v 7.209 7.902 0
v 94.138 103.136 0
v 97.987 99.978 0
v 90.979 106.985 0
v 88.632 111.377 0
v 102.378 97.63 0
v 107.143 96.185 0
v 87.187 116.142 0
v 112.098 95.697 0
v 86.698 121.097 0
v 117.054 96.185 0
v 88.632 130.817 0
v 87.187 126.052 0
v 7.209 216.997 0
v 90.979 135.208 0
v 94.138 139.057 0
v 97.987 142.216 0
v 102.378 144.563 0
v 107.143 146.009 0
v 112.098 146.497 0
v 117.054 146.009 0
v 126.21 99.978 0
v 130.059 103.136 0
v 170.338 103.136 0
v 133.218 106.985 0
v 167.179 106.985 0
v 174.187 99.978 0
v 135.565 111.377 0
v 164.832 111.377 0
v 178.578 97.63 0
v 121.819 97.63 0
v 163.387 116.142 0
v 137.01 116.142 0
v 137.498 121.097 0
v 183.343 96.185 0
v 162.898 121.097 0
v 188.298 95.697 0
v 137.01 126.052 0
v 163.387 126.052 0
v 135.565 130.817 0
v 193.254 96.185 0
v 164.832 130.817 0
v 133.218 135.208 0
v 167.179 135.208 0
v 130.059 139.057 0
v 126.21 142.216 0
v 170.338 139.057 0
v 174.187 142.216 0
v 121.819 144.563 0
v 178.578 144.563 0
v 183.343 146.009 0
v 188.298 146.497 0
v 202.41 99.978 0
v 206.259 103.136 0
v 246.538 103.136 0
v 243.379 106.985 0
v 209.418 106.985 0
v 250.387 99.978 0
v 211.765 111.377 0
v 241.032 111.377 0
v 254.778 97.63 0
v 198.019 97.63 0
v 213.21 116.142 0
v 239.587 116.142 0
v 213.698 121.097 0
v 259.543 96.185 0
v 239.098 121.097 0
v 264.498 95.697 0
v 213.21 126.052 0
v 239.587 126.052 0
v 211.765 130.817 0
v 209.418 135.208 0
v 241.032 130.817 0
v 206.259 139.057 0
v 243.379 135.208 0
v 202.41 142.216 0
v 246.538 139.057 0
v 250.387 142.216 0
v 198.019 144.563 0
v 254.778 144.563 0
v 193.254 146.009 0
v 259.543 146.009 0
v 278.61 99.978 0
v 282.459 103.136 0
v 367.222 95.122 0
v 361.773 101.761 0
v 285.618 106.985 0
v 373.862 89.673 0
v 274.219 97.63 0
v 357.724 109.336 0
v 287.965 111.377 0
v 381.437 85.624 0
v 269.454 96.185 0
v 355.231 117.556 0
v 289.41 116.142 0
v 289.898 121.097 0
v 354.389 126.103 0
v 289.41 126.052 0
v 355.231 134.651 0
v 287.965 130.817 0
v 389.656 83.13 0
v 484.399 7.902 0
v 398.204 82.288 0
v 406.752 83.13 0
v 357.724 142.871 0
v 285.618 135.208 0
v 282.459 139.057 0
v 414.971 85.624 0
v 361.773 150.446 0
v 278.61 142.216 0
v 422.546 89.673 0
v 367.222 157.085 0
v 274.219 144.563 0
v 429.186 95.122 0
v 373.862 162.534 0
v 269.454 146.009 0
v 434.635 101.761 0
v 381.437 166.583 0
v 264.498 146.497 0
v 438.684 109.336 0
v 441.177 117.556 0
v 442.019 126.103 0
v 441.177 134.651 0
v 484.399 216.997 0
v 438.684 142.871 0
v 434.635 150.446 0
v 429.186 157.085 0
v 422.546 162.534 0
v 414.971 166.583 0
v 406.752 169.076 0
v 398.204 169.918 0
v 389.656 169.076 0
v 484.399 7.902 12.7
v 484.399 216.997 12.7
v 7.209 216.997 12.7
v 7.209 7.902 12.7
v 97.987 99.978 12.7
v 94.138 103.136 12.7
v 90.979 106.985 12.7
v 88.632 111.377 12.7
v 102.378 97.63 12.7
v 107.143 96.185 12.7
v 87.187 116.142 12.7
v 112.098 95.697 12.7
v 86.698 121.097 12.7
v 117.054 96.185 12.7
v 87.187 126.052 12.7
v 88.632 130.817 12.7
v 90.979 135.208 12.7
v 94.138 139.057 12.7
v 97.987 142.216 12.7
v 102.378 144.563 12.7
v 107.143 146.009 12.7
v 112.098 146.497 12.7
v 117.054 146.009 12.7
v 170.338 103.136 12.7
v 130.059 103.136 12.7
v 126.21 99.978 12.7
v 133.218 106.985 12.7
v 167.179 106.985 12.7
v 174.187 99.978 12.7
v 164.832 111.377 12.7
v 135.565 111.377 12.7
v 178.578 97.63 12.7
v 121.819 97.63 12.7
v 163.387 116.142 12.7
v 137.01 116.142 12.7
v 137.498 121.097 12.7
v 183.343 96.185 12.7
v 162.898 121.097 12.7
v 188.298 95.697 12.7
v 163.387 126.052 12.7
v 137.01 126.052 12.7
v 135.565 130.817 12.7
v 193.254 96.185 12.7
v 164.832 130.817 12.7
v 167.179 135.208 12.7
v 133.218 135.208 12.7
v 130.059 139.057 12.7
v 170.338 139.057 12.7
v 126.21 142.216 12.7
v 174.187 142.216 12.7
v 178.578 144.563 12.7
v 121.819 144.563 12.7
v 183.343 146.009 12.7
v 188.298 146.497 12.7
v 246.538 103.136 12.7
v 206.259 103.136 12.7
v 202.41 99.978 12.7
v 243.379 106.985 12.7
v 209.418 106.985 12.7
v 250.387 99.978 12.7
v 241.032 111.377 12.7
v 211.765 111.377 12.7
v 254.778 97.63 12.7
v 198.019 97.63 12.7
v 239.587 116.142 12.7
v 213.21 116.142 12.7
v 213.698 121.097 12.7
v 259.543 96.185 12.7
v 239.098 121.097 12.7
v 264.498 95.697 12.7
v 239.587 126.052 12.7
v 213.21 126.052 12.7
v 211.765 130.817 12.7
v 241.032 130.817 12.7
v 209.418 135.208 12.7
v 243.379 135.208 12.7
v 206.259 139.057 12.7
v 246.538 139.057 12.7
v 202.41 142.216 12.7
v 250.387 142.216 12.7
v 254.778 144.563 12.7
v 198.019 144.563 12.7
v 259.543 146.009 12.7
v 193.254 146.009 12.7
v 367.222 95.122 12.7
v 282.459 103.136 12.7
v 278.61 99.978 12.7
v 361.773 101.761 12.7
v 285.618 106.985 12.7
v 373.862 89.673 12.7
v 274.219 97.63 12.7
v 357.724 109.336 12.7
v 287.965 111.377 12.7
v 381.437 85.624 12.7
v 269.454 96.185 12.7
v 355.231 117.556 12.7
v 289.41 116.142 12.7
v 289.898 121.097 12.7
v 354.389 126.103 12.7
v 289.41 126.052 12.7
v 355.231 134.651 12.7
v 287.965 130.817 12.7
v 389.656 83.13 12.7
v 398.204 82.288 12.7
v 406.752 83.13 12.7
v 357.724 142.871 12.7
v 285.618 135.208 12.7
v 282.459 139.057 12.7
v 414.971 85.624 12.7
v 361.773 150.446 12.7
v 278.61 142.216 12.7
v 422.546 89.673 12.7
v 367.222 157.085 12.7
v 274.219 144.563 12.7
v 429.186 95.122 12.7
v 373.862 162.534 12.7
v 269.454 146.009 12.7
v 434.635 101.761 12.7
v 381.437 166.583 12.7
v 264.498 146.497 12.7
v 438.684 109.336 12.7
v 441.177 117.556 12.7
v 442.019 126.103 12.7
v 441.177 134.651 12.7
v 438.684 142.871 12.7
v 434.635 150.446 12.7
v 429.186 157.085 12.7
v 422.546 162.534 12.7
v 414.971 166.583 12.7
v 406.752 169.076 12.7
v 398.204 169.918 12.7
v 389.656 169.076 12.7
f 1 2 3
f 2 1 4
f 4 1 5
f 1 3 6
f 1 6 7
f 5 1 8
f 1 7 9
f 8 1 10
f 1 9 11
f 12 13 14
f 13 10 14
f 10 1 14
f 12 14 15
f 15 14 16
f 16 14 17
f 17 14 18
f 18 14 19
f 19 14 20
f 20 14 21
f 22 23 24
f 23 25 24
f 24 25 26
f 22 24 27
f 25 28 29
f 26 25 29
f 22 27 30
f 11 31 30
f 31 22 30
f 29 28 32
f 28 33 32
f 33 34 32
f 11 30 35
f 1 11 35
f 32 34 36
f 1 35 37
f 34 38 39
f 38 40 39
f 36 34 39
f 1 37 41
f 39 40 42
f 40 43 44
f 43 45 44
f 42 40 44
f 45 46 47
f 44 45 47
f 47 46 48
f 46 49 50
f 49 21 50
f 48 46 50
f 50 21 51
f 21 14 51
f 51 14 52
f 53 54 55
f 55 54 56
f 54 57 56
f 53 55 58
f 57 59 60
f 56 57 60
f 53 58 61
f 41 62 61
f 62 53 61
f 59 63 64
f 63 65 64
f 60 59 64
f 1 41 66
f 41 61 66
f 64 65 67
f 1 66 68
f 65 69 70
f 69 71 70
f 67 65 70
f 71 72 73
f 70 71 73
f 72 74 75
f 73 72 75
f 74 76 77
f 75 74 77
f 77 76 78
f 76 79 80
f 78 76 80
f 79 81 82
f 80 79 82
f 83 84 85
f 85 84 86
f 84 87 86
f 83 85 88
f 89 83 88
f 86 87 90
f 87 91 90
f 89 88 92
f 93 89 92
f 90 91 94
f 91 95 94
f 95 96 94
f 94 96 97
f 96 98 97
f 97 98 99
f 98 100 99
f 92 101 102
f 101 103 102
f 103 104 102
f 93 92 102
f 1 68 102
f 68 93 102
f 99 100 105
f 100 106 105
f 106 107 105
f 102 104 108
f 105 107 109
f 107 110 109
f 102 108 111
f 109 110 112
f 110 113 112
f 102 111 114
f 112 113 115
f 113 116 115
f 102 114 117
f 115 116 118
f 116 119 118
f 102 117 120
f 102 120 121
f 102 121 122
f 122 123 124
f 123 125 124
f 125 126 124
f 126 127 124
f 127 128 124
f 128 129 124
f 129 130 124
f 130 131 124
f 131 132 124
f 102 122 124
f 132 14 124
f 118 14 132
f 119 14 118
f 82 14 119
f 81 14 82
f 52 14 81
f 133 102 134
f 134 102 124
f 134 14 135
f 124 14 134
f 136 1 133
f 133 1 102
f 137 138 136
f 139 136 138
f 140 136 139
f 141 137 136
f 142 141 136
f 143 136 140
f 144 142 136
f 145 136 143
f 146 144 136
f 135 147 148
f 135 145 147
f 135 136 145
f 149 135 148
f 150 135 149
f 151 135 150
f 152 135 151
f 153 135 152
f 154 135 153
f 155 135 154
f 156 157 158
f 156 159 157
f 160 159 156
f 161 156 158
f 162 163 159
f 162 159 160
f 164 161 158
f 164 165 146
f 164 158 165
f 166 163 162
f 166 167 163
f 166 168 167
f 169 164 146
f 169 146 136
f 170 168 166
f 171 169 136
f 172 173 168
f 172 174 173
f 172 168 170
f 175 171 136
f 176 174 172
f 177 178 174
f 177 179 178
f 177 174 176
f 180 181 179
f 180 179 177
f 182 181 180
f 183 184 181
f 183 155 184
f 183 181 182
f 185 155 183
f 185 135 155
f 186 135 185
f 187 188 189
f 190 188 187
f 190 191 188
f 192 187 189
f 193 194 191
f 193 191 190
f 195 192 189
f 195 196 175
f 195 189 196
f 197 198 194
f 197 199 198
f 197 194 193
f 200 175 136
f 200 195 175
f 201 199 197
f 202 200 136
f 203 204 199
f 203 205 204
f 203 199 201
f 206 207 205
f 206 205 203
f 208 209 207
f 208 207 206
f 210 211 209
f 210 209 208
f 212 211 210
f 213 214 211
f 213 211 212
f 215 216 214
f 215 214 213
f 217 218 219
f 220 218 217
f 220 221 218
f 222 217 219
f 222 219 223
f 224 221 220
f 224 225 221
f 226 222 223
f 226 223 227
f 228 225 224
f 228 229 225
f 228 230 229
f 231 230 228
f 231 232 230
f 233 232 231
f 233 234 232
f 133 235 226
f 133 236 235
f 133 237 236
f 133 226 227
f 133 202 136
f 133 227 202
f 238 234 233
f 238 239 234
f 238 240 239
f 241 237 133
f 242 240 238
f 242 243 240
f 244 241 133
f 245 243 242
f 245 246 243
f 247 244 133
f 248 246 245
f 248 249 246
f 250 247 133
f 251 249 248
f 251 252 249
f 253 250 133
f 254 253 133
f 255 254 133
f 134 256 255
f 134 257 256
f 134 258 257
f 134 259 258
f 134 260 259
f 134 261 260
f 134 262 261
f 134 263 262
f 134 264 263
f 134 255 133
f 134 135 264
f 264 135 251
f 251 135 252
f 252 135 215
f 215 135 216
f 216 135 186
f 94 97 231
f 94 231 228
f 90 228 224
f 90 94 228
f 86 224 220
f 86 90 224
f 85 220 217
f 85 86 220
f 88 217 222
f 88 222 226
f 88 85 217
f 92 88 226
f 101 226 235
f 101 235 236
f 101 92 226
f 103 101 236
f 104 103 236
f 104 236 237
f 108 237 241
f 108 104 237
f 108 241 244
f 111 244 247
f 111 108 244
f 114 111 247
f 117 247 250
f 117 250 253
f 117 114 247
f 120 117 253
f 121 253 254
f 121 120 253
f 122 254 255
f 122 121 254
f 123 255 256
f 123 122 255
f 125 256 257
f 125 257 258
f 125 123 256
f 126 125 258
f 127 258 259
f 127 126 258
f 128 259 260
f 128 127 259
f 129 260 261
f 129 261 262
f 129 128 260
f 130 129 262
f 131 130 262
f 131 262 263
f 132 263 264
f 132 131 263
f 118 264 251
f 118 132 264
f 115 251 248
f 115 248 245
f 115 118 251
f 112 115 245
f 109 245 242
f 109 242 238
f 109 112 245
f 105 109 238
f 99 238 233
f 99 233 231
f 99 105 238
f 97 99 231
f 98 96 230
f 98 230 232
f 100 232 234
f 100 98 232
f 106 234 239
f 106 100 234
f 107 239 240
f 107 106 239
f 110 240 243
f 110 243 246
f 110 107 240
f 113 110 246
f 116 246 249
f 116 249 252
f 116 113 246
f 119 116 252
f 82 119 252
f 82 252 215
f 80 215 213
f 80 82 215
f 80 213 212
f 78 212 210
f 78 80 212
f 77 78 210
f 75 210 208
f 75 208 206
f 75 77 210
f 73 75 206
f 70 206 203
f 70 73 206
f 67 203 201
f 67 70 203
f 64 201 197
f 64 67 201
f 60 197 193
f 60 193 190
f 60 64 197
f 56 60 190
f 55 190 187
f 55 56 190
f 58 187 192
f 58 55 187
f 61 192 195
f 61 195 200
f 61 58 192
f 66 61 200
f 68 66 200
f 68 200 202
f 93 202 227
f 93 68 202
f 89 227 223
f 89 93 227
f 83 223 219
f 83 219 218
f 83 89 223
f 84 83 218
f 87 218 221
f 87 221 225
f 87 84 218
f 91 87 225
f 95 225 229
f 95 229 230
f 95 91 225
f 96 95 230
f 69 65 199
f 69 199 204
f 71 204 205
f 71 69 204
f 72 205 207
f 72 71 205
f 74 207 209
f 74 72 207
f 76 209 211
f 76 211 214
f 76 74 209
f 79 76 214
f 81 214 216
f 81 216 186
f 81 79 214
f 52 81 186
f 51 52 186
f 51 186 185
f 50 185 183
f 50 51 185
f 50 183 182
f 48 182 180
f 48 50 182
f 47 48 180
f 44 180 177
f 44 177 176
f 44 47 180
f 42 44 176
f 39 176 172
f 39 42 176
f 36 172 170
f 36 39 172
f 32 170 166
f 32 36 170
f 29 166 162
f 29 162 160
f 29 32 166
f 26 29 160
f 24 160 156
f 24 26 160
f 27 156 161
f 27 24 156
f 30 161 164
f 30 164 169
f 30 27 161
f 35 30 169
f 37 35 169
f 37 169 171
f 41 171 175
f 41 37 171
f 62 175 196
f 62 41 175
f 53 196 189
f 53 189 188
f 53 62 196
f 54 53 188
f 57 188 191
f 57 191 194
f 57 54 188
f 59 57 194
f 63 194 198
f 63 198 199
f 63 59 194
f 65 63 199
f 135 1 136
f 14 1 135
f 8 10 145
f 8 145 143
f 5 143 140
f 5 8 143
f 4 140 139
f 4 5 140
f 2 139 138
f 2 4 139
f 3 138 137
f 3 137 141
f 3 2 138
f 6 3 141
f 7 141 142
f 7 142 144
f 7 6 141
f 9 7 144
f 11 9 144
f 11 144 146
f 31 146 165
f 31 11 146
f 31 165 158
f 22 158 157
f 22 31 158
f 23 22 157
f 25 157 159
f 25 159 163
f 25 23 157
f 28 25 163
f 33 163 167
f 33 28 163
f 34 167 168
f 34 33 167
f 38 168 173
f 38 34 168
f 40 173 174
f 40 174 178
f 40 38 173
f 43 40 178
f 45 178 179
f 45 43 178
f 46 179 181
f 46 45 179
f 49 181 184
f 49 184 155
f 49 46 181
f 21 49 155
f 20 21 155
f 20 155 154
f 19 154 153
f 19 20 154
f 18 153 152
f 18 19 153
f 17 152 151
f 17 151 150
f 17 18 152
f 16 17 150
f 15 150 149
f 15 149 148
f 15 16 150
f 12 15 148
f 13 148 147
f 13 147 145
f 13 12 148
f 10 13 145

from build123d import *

# Parameters (mm, degrees)
MODEL_W             = 477.189260789
MODEL_H             = 209.095023119
BOSS_EXTRUDE1_DEPTH = 12.7


with BuildPart() as part:
    # Model → Boss-Extrude1 (new body)
    with BuildSketch(Plane.XY):
        with Locations((245.803972347, 112.449415536)):
            Rectangle(MODEL_W, MODEL_H)
        with BuildLine():
            ThreePointArc((239.098491904, 121.096908294), (264.498491904, 95.696908294), (289.898491904, 121.096908294))
            ThreePointArc((289.898491904, 121.096908294), (264.498491904, 146.496908294), (239.098491904, 121.096908294))
        make_face(mode=Mode.SUBTRACT)
        with BuildLine():
            ThreePointArc((162.898491904, 121.096908294), (188.298491904, 95.696908294), (213.698491904, 121.096908294))
            ThreePointArc((213.698491904, 121.096908294), (188.298491904, 146.496908294), (162.898491904, 121.096908294))
        make_face(mode=Mode.SUBTRACT)
        with BuildLine():
            ThreePointArc((137.498491904, 121.096908294), (112.098491904, 146.496908294), (86.698491904, 121.096908294))
            ThreePointArc((86.698491904, 121.096908294), (112.098491904, 95.696908294), (137.498491904, 121.096908294))
        make_face(mode=Mode.SUBTRACT)
        with BuildLine():
            ThreePointArc((442.018972347, 126.103389526), (398.203972347, 169.918389526), (354.388972347, 126.103389526))
            ThreePointArc((354.388972347, 126.103389526), (398.203972347, 82.288389526), (442.018972347, 126.103389526))
        make_face(mode=Mode.SUBTRACT)
    extrude(amount=BOSS_EXTRUDE1_DEPTH)


solid = part.part
